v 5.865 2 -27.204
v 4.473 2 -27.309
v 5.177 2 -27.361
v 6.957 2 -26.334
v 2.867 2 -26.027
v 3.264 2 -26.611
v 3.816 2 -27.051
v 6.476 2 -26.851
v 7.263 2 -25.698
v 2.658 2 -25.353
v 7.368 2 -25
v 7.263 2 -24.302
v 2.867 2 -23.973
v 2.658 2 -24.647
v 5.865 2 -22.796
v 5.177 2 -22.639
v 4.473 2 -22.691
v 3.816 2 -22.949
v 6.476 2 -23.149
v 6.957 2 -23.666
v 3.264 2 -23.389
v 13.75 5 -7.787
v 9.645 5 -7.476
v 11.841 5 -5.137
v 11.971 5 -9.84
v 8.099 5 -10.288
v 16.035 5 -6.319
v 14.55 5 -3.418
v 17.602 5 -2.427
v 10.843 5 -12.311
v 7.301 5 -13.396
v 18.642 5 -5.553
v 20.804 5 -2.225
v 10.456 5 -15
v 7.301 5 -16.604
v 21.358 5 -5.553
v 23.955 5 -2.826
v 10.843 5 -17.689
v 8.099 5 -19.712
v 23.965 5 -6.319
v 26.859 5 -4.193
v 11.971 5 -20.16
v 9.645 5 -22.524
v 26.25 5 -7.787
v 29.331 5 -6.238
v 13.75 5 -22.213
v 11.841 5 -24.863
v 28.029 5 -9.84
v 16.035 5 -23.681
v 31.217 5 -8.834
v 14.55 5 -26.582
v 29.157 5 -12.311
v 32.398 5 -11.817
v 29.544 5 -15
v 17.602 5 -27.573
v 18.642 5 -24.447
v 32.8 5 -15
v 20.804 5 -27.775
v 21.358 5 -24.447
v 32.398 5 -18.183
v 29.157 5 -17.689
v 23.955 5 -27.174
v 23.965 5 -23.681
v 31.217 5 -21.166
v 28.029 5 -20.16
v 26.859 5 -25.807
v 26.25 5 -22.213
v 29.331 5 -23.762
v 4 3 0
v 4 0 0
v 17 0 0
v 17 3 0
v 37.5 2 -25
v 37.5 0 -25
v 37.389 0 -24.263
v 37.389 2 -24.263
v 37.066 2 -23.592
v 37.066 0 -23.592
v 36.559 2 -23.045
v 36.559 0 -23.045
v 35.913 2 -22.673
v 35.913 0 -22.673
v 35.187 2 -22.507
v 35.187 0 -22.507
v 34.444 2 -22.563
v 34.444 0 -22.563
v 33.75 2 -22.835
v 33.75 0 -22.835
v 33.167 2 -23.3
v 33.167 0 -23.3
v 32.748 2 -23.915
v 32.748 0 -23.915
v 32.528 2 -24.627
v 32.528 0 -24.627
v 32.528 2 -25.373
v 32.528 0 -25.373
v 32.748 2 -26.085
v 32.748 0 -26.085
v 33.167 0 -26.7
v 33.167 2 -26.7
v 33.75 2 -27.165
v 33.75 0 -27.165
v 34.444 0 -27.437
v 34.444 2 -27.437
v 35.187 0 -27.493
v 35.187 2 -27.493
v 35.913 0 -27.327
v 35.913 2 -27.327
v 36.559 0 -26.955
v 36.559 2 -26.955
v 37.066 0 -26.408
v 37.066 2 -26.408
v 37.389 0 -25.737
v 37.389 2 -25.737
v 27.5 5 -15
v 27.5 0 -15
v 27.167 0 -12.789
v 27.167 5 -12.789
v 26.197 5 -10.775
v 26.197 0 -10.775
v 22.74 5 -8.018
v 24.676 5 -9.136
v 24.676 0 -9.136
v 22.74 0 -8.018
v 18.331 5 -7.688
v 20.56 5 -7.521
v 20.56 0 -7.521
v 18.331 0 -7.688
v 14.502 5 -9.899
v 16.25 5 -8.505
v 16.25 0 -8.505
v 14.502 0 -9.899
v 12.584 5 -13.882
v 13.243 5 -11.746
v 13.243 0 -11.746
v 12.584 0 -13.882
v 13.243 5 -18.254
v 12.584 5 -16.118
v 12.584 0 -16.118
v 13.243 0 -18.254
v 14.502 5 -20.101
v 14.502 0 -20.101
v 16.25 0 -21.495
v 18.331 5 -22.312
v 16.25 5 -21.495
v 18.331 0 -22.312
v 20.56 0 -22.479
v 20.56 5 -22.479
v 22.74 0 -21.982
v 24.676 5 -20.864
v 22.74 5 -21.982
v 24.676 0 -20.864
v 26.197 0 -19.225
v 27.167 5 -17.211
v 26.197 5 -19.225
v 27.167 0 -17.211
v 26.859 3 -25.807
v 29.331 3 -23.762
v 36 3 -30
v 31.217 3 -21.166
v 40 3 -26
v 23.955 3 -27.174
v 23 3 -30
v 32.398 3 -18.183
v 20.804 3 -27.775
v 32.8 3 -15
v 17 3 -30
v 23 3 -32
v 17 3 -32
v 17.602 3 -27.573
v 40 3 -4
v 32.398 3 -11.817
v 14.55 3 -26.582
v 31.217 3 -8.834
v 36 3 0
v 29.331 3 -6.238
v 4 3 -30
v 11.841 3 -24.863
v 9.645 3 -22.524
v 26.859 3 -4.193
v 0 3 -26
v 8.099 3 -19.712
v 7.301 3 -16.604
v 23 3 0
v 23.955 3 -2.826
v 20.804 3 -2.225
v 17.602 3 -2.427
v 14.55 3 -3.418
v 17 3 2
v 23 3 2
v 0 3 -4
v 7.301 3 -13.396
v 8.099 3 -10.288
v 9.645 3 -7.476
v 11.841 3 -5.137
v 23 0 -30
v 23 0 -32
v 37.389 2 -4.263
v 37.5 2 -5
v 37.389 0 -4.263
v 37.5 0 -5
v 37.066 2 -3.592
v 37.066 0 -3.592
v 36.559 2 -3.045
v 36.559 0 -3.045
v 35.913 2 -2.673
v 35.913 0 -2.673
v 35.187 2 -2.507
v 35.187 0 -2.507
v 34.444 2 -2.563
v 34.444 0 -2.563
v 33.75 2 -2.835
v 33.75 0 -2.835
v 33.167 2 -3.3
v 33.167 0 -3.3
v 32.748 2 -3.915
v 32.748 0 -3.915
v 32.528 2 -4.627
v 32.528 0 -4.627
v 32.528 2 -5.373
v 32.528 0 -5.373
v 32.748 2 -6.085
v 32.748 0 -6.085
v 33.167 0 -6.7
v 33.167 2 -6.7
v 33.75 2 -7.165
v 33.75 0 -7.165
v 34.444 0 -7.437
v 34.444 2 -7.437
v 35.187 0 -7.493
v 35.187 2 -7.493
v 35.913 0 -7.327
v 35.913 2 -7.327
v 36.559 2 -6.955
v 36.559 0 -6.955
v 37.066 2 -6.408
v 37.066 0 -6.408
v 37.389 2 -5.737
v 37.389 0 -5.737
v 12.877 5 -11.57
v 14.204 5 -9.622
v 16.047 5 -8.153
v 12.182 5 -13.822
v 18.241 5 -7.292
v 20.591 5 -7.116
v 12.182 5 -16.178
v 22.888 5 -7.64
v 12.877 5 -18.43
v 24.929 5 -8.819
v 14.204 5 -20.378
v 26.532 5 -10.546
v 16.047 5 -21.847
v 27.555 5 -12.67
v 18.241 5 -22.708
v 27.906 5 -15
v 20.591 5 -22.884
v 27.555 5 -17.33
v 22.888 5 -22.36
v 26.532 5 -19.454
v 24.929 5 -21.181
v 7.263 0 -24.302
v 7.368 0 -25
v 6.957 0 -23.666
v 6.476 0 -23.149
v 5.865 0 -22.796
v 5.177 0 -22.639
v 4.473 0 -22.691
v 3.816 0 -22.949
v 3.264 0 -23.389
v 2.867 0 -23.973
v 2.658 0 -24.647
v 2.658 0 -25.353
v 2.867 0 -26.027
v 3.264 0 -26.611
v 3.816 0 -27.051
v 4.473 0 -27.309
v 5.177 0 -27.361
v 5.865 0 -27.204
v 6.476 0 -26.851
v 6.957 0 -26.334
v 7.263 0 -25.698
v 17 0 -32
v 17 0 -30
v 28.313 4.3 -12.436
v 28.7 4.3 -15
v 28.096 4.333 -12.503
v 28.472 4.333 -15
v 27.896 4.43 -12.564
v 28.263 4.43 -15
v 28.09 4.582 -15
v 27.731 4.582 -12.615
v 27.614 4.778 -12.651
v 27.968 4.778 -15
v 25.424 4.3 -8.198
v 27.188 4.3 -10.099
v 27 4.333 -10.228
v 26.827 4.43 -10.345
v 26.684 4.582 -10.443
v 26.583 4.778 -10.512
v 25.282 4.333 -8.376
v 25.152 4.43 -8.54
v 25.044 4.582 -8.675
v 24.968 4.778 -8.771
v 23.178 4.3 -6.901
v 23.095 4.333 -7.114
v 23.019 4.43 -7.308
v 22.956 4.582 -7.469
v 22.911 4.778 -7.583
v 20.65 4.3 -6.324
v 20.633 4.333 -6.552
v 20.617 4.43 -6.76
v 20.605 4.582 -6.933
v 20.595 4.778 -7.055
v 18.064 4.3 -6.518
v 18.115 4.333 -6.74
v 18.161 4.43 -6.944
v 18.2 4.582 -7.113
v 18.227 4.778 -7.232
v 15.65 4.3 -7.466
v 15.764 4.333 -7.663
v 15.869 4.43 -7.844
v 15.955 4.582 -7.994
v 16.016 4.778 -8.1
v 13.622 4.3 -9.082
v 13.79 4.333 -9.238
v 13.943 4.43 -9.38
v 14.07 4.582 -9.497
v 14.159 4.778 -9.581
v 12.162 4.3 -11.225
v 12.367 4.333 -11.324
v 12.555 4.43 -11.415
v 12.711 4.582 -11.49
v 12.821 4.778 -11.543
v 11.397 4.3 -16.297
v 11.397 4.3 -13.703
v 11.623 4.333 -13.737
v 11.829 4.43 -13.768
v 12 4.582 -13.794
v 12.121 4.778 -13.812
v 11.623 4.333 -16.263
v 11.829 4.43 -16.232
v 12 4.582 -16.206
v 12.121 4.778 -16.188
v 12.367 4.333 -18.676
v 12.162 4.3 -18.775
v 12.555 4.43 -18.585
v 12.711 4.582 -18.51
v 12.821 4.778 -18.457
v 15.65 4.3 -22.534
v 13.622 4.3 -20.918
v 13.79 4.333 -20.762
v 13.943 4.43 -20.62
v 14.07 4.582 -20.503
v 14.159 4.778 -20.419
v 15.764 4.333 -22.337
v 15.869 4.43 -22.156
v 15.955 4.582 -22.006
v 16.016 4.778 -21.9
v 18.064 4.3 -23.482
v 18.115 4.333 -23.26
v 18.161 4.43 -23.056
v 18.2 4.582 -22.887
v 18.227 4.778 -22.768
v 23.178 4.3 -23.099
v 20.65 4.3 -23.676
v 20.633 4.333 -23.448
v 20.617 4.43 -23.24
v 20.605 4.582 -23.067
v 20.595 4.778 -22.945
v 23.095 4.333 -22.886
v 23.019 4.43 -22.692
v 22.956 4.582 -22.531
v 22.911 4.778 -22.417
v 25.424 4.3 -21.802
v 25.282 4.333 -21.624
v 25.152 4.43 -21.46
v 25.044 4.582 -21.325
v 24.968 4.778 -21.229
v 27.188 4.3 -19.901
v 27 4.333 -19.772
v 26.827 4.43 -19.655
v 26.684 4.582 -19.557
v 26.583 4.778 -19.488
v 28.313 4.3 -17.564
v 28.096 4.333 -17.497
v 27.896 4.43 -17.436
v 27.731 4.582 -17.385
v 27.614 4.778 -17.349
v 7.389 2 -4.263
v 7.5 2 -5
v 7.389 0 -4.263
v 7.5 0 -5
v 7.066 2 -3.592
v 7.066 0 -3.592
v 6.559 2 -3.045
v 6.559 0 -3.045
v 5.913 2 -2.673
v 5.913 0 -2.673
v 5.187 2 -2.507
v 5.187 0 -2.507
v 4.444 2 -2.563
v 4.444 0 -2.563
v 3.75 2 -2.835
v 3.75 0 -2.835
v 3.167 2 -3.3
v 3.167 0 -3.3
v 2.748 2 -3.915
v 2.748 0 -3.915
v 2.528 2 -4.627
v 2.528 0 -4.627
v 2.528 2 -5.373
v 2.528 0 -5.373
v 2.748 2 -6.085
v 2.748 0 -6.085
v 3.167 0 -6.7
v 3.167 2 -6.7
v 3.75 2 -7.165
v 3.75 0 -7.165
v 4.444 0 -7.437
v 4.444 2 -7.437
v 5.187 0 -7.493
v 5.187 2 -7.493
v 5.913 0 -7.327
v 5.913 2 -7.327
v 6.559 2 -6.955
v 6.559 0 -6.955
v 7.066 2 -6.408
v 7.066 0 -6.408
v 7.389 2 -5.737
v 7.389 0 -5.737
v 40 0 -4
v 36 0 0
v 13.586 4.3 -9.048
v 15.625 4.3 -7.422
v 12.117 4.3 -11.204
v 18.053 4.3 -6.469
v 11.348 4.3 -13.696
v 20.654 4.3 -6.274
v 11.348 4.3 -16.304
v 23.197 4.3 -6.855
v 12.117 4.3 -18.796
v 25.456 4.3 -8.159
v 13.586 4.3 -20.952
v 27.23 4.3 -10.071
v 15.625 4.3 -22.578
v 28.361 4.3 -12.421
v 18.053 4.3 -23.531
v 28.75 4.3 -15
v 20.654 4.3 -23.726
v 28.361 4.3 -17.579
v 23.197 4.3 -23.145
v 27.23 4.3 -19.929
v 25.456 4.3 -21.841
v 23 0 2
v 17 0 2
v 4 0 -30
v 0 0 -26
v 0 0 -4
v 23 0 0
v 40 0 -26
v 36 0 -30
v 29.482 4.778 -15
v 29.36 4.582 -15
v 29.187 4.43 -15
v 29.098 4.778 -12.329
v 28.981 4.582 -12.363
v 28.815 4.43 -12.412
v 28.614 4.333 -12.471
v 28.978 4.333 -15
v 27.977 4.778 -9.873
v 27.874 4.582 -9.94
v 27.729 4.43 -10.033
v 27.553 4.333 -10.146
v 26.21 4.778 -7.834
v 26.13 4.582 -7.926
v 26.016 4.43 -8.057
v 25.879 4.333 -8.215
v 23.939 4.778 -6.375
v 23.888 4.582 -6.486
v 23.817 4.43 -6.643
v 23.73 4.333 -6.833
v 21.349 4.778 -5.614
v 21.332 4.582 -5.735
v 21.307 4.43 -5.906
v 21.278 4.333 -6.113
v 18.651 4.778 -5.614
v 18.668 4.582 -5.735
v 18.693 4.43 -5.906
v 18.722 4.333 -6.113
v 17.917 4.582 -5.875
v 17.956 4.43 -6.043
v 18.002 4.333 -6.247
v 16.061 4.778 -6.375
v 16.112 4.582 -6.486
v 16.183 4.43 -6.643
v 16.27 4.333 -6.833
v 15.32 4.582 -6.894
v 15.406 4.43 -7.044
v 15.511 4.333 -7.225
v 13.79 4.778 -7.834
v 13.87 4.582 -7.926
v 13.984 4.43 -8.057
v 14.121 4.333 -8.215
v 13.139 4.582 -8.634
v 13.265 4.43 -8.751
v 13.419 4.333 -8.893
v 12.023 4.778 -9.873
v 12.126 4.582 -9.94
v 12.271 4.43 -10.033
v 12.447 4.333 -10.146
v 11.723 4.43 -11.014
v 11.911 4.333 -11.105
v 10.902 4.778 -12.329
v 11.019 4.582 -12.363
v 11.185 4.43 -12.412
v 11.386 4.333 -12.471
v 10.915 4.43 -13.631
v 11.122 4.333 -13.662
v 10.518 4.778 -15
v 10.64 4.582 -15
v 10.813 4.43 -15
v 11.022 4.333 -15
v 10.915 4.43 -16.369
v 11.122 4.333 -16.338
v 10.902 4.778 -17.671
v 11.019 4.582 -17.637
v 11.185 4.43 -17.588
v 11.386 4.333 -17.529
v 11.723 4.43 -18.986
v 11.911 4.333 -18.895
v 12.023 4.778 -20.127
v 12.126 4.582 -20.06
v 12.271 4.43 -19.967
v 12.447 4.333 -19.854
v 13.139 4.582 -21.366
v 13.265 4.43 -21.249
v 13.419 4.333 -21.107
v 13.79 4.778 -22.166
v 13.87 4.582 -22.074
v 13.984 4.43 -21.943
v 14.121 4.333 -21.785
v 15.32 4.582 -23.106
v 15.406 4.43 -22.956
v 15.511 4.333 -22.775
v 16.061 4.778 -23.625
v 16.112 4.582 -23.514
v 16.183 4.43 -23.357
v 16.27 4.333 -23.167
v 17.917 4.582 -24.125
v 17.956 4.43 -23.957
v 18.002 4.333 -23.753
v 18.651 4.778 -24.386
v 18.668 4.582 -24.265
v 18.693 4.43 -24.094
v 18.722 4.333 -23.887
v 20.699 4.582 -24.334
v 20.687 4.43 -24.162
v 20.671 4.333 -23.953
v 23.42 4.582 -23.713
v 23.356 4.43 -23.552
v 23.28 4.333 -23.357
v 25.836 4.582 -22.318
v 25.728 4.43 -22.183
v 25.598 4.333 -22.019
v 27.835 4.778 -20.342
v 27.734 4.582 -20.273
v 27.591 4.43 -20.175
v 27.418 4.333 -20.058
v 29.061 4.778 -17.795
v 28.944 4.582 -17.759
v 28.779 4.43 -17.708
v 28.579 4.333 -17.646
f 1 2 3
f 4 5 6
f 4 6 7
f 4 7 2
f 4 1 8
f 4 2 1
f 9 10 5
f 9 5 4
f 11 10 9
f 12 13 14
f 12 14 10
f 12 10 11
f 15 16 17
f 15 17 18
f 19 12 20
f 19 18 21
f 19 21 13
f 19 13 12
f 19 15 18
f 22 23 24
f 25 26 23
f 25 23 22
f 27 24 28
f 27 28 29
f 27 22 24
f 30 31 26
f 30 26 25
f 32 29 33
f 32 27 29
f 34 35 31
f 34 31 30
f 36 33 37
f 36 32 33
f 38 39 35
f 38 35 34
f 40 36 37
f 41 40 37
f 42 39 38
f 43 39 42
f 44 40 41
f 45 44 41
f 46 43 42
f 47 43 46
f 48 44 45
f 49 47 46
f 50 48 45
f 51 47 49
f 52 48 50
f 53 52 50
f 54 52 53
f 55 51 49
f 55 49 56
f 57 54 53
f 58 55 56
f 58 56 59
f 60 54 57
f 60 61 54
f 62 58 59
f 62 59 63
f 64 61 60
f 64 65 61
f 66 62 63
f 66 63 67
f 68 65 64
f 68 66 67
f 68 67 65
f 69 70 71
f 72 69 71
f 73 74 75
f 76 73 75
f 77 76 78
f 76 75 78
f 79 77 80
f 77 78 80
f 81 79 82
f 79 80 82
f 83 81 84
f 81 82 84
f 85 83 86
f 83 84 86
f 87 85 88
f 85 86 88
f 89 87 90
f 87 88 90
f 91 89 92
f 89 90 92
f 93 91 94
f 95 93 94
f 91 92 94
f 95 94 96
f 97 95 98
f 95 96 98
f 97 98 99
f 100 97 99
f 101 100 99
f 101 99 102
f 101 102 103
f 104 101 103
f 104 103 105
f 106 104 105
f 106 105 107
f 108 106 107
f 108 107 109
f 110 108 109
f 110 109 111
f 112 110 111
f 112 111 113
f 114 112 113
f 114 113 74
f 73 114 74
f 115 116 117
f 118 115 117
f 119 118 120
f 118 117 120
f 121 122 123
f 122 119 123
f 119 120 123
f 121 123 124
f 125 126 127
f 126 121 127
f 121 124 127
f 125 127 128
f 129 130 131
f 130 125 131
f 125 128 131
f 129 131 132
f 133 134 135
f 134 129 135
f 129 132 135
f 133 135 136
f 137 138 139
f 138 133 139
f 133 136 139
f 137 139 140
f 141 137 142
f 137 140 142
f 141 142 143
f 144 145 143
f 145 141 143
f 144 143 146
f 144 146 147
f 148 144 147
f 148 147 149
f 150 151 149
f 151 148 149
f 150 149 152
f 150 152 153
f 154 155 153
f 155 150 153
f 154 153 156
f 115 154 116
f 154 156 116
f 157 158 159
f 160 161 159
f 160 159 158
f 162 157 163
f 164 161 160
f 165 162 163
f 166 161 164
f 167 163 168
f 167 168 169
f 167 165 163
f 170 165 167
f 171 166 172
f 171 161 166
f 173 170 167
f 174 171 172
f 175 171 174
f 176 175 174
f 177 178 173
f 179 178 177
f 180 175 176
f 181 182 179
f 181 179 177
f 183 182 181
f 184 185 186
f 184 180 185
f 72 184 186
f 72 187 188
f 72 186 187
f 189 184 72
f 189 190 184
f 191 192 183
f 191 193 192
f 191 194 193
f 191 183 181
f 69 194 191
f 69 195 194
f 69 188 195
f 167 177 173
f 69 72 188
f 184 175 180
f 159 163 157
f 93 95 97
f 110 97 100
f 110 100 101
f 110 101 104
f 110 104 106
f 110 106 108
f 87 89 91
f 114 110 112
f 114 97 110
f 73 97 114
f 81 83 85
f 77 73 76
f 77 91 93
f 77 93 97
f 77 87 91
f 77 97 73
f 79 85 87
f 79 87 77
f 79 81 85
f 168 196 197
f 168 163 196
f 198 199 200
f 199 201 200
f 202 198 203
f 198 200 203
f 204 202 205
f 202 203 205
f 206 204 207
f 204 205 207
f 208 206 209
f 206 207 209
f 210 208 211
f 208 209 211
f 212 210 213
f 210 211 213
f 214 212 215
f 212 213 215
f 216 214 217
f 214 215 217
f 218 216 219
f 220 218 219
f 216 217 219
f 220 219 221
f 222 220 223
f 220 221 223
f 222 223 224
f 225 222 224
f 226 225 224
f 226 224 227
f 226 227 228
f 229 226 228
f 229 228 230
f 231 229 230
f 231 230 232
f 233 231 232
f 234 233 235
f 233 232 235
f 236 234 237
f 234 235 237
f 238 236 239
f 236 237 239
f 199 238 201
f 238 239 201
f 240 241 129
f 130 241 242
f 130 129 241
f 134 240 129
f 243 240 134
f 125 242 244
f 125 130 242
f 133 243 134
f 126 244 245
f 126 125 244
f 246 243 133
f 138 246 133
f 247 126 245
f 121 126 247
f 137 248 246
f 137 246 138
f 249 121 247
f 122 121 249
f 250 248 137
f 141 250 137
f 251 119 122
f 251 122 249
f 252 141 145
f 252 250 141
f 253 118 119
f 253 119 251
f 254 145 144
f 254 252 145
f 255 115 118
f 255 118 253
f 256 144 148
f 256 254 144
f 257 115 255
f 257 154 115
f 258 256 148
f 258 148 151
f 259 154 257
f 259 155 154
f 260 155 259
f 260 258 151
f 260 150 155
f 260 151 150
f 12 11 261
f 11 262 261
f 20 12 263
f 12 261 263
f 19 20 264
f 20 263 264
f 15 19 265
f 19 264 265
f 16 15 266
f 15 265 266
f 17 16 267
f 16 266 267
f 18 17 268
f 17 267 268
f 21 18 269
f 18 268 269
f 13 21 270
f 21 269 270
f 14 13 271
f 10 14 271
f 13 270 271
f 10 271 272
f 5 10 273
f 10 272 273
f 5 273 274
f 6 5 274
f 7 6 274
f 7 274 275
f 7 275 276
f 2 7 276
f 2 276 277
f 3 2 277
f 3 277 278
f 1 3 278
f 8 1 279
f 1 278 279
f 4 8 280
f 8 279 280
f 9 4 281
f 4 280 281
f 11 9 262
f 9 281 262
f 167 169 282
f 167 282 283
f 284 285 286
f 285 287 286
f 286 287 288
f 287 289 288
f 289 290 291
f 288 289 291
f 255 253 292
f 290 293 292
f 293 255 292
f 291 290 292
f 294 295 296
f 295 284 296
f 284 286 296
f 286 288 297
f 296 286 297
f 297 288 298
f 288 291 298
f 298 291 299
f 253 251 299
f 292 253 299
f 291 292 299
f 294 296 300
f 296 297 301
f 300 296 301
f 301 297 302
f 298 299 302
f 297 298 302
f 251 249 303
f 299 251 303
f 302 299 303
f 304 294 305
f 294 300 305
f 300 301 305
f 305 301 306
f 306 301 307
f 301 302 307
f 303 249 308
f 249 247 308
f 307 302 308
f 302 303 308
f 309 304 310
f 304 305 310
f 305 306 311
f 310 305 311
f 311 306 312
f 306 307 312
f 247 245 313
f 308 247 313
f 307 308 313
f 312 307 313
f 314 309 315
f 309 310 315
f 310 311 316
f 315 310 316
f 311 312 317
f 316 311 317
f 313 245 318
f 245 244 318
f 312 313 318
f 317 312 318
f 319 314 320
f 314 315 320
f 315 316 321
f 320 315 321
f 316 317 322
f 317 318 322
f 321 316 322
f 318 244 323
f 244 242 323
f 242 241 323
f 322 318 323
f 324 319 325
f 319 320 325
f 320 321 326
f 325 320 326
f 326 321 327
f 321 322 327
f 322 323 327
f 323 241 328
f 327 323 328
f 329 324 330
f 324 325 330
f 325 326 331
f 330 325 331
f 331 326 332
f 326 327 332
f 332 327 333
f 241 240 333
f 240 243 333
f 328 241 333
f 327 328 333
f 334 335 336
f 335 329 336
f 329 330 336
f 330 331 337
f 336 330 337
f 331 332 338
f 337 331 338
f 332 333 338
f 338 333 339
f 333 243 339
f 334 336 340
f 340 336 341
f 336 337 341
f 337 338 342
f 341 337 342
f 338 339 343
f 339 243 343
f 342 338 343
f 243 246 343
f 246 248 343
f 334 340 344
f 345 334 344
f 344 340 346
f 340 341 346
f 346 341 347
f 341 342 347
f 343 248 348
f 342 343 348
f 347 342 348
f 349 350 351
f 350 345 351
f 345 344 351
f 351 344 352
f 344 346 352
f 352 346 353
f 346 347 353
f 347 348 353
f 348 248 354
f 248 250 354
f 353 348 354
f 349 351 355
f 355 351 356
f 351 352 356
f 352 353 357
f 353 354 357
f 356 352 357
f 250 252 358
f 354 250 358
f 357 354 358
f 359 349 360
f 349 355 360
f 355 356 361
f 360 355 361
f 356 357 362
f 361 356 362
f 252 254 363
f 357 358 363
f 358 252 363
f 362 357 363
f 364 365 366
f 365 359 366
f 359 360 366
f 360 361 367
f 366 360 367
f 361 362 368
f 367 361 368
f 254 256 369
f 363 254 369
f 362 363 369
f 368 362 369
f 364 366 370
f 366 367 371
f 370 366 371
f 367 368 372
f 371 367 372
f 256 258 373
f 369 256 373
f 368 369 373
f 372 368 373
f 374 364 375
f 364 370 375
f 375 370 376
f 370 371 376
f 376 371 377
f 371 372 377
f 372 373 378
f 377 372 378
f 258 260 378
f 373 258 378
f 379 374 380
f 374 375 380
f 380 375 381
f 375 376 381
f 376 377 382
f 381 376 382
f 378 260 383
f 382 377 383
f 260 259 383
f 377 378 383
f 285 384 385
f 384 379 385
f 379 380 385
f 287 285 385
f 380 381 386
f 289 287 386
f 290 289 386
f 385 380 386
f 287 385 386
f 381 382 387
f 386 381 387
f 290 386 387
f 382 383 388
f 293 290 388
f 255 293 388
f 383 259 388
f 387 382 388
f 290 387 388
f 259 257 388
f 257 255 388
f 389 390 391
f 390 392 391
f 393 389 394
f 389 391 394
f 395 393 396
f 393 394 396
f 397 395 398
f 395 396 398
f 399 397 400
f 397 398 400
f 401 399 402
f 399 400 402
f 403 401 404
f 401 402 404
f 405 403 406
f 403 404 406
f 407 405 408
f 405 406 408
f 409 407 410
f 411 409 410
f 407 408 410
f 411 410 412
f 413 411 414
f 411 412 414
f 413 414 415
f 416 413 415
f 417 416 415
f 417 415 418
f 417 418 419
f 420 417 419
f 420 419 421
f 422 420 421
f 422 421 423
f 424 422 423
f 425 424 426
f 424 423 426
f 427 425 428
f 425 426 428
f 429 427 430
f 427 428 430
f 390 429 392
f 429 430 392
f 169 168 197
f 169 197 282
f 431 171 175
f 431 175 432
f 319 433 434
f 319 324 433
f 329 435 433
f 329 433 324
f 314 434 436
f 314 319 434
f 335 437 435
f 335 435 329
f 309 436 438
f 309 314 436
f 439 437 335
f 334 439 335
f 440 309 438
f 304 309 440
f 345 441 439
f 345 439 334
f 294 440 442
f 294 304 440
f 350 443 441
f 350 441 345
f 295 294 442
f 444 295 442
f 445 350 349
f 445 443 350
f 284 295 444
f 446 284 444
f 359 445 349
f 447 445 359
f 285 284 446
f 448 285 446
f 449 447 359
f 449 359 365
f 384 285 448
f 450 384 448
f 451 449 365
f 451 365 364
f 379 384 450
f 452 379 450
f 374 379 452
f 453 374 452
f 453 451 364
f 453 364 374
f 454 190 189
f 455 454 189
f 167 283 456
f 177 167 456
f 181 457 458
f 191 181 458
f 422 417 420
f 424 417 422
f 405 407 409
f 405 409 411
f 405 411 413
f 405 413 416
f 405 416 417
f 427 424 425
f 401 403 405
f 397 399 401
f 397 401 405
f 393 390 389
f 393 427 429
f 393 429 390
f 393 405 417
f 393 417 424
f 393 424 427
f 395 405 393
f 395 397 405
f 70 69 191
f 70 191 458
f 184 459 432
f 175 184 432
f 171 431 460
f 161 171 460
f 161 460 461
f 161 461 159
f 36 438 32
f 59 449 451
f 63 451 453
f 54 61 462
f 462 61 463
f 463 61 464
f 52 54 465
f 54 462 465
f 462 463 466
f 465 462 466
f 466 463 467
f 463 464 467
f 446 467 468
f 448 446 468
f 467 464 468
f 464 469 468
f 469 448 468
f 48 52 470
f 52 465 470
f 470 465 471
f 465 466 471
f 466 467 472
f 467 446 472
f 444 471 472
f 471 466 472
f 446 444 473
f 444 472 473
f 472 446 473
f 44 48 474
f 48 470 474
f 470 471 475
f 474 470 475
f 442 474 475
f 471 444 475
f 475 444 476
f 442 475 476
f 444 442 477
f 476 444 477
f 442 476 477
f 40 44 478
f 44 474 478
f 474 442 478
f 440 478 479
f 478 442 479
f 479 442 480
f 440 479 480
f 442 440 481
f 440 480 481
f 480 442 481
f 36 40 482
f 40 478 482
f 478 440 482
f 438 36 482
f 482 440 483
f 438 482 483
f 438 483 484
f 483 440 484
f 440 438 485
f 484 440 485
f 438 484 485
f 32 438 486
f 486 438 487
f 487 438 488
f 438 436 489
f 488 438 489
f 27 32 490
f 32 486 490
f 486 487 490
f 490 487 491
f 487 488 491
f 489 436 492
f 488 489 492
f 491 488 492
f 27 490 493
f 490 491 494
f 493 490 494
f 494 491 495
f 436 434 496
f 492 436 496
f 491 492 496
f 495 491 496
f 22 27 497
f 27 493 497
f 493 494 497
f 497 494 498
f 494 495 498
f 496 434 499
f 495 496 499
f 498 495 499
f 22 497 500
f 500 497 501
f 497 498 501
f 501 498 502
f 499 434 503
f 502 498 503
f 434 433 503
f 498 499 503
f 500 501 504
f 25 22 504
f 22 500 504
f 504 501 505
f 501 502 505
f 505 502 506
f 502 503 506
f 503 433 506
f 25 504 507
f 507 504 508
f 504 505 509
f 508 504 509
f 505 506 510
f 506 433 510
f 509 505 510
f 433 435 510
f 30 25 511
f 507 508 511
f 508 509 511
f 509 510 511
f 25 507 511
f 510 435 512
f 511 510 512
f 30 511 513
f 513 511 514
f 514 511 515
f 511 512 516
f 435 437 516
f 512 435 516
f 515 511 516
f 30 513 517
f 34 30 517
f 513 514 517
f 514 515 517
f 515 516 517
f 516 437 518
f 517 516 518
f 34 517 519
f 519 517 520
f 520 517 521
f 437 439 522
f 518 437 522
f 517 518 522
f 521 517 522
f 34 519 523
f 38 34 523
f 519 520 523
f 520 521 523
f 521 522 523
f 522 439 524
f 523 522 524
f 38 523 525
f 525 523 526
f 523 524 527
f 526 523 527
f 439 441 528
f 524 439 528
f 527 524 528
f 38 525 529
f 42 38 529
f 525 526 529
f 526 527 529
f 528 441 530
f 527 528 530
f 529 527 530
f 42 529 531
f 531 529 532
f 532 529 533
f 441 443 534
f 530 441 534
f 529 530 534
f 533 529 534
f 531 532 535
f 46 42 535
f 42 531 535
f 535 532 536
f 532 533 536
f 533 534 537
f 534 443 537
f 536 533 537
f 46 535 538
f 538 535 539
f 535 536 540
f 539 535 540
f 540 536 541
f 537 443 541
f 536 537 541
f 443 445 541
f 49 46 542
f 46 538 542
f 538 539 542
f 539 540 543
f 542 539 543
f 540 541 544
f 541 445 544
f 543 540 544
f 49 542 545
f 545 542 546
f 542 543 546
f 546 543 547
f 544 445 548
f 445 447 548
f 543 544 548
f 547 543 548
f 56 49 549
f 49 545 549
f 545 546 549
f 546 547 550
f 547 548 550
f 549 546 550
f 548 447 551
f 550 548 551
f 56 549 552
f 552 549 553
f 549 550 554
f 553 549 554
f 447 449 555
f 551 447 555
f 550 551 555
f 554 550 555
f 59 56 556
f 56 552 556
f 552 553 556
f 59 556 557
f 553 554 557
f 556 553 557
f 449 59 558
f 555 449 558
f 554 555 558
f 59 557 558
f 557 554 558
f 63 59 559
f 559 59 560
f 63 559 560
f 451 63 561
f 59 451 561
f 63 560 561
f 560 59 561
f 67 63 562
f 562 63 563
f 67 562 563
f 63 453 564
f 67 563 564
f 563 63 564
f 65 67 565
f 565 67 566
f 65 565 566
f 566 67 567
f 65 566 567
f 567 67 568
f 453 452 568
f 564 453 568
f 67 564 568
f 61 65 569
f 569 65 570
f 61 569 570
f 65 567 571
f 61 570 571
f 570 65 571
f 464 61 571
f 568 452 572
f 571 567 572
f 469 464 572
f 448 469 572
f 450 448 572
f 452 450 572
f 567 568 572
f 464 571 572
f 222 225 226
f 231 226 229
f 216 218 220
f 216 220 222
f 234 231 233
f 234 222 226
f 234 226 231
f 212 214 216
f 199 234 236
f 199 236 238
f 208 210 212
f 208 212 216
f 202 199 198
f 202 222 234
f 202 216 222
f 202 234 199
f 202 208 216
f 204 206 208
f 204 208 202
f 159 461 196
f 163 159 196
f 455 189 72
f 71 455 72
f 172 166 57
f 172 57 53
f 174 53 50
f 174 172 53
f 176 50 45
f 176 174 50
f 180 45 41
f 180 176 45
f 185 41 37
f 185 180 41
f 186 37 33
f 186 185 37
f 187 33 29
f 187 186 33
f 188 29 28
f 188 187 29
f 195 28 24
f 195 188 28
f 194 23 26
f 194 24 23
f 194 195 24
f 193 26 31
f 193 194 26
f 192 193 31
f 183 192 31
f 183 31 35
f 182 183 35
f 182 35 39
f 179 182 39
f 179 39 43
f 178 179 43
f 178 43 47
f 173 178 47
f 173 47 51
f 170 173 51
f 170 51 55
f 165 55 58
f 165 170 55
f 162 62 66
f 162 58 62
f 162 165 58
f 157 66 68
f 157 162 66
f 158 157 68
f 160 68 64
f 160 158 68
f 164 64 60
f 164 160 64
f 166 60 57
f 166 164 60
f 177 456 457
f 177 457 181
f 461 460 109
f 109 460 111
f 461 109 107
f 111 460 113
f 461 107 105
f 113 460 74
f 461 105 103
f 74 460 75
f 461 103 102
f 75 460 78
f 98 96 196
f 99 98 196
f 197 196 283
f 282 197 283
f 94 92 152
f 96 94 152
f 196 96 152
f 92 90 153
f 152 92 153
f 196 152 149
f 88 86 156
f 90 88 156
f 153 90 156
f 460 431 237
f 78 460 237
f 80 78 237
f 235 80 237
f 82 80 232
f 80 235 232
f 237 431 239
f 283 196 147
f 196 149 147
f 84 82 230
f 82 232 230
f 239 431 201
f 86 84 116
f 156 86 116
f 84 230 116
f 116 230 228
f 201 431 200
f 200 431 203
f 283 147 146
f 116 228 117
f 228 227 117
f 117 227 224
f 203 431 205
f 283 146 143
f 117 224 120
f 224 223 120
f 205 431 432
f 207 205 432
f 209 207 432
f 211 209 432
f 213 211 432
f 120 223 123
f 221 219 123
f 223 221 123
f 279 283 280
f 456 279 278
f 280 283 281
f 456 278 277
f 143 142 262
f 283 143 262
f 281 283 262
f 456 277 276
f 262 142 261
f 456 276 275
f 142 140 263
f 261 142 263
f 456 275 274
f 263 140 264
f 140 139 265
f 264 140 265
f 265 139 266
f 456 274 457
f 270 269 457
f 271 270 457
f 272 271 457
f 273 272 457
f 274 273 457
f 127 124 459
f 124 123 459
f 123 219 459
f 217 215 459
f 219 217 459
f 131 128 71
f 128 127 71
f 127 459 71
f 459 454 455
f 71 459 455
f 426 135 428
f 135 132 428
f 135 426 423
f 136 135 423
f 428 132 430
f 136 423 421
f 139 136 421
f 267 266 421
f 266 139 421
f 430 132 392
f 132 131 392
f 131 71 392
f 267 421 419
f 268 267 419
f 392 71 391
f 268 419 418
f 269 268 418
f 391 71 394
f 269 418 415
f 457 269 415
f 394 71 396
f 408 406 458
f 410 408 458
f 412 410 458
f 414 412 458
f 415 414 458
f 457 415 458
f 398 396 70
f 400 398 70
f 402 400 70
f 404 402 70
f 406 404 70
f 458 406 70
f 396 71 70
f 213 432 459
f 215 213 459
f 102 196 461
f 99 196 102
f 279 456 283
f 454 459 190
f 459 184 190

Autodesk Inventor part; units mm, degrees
ref_plane "YZ Plane" through (0, 0, 0) normal (1, 0, 0) x (0, 1, 0)
ref_plane "XZ Plane" through (0, 0, 0) normal (0, 1, 0) x (-1, 0, 0)
ref_plane "XY Plane" through (0, 0, 0) normal (0, 0, 1) x (1, 0, 0)
sketch "Sketch1" plane through (0, 0, 0) normal (0, 1, 0) x (-1, 0, 0)
  line L0 (0, 0) -> (-40, 0)
  line L1 (-40, 0) -> (-40, -30)
  line L2 (-40, -30) -> (0, -30)
  line L3 (0, -30) -> (0, 0)
  dimension "d0" = 30
  dimension "d1" = 40
extrude "Extrusion1" add sketch "Sketch1" along normal blind 3
sketch "Sketch2" plane through (0, 3, 0) normal (0, 1, 0) x (1, 0, 0)
  circle A0 centre (20, 15) radius 7.5
  line L0 (0, 30) -> (0, 0) projected
  line L1 (0, 0) -> (40, 0) projected
  dimension "d4" = 15
  dimension "d5" = 20
  dimension "d6" = 15
extrude "Extrusion2" cut sketch "Sketch2" against normal blind 3
sketch "Sketch3" plane through (0, 3, 0) normal (0, 1, 0) x (1, 0, 0)
  circle A0 centre (20, 15) radius 7.5 projected
  circle A1 centre (20, 15) radius 7.5
  circle A2 centre (20, 15) radius 12.8
  point P0 (0, 0)
  dimension "d9" = 25.6
extrude "Extrusion3" add sketch "Sketch3" along normal blind 2
sketch "Sketch4" plane through (0, 0, 0) normal (0, -1, 0) x (1, 0, 0)
  circle A0 centre (5, -25) radius 2.368
  circle A1 centre (5, -5) radius 2.5
  circle A2 centre (35, -25) radius 2.5
  circle A3 centre (35, -5) radius 2.5
  circle A4 centre (20, -15) radius 7.5 projected
  point P0 (0, 0)
  dimension "d12" = 5
  dimension "d13" = 5
  dimension "d14" = 5
  dimension "d15" = 15
  dimension "d16" = 10
  dimension "d17" = 10
  dimension "d18" = 15
  dimension "d19" = 15
  dimension "d20" = 15
  dimension "d21" = 10
  dimension "d22" = 10
extrude "Extrusion4" cut sketch "Sketch4" against normal blind 2 contours A0 | A1 | A2 | A3
chamfer "Chamfer1" distance 4 angle 45 4 edges at (40, 1.5, 0) (40, 1.5, -30) (0, 1.5, 0) (0, 1.5, -30)
sketch "Sketch5" plane through (0, 3, 0) normal (0, 1, 0) x (1, 0, 0)
  line L0 (36, 30) -> (4, 30) projected
  line L1 (17, 30) -> (23, 30)
  line L2 (23, 30) -> (23, 32)
  line L3 (23, 32) -> (17, 32)
  line L4 (17, 32) -> (17, 30)
  line L5 (17, 0) -> (23, 0)
  line L6 (23, 0) -> (23, -2)
  line L7 (23, -2) -> (17, -2)
  line L8 (17, -2) -> (17, 0)
  line L9 (0, 26) -> (0, 4) projected
  line L10 (4, 0) -> (36, 0) projected
  point P0 (0, 0)
  dimension "d28" = 6
  dimension "d29" = 17
  dimension "d30" = 2
  dimension "d31" = 6
  dimension "d32" = 17
  dimension "d33" = 2
  dimension "d34" = 0
  dimension "d35" = 2
extrude "Extrusion5" add sketch "Sketch5" against normal blind 3
sketch "Sketch6" plane through (20, 5, -15) normal (0, 1, 0) x (1, 0, 0)
  circle A0 centre (0, 0) radius 9.55
  circle A1 centre (0, 0) radius 7.9
  point P0 (-20, -15)
  dimension "d38" = 15.8
  dimension "d39" = 19.1
extrude "Extrusion6" cut sketch "Sketch6" against normal blind 0.7
fillet "Fillet1" radius 0.8 2 edges at (12.1, 4.3, -15) (10.45, 4.3, -15)
properties part number "chamber_top"
